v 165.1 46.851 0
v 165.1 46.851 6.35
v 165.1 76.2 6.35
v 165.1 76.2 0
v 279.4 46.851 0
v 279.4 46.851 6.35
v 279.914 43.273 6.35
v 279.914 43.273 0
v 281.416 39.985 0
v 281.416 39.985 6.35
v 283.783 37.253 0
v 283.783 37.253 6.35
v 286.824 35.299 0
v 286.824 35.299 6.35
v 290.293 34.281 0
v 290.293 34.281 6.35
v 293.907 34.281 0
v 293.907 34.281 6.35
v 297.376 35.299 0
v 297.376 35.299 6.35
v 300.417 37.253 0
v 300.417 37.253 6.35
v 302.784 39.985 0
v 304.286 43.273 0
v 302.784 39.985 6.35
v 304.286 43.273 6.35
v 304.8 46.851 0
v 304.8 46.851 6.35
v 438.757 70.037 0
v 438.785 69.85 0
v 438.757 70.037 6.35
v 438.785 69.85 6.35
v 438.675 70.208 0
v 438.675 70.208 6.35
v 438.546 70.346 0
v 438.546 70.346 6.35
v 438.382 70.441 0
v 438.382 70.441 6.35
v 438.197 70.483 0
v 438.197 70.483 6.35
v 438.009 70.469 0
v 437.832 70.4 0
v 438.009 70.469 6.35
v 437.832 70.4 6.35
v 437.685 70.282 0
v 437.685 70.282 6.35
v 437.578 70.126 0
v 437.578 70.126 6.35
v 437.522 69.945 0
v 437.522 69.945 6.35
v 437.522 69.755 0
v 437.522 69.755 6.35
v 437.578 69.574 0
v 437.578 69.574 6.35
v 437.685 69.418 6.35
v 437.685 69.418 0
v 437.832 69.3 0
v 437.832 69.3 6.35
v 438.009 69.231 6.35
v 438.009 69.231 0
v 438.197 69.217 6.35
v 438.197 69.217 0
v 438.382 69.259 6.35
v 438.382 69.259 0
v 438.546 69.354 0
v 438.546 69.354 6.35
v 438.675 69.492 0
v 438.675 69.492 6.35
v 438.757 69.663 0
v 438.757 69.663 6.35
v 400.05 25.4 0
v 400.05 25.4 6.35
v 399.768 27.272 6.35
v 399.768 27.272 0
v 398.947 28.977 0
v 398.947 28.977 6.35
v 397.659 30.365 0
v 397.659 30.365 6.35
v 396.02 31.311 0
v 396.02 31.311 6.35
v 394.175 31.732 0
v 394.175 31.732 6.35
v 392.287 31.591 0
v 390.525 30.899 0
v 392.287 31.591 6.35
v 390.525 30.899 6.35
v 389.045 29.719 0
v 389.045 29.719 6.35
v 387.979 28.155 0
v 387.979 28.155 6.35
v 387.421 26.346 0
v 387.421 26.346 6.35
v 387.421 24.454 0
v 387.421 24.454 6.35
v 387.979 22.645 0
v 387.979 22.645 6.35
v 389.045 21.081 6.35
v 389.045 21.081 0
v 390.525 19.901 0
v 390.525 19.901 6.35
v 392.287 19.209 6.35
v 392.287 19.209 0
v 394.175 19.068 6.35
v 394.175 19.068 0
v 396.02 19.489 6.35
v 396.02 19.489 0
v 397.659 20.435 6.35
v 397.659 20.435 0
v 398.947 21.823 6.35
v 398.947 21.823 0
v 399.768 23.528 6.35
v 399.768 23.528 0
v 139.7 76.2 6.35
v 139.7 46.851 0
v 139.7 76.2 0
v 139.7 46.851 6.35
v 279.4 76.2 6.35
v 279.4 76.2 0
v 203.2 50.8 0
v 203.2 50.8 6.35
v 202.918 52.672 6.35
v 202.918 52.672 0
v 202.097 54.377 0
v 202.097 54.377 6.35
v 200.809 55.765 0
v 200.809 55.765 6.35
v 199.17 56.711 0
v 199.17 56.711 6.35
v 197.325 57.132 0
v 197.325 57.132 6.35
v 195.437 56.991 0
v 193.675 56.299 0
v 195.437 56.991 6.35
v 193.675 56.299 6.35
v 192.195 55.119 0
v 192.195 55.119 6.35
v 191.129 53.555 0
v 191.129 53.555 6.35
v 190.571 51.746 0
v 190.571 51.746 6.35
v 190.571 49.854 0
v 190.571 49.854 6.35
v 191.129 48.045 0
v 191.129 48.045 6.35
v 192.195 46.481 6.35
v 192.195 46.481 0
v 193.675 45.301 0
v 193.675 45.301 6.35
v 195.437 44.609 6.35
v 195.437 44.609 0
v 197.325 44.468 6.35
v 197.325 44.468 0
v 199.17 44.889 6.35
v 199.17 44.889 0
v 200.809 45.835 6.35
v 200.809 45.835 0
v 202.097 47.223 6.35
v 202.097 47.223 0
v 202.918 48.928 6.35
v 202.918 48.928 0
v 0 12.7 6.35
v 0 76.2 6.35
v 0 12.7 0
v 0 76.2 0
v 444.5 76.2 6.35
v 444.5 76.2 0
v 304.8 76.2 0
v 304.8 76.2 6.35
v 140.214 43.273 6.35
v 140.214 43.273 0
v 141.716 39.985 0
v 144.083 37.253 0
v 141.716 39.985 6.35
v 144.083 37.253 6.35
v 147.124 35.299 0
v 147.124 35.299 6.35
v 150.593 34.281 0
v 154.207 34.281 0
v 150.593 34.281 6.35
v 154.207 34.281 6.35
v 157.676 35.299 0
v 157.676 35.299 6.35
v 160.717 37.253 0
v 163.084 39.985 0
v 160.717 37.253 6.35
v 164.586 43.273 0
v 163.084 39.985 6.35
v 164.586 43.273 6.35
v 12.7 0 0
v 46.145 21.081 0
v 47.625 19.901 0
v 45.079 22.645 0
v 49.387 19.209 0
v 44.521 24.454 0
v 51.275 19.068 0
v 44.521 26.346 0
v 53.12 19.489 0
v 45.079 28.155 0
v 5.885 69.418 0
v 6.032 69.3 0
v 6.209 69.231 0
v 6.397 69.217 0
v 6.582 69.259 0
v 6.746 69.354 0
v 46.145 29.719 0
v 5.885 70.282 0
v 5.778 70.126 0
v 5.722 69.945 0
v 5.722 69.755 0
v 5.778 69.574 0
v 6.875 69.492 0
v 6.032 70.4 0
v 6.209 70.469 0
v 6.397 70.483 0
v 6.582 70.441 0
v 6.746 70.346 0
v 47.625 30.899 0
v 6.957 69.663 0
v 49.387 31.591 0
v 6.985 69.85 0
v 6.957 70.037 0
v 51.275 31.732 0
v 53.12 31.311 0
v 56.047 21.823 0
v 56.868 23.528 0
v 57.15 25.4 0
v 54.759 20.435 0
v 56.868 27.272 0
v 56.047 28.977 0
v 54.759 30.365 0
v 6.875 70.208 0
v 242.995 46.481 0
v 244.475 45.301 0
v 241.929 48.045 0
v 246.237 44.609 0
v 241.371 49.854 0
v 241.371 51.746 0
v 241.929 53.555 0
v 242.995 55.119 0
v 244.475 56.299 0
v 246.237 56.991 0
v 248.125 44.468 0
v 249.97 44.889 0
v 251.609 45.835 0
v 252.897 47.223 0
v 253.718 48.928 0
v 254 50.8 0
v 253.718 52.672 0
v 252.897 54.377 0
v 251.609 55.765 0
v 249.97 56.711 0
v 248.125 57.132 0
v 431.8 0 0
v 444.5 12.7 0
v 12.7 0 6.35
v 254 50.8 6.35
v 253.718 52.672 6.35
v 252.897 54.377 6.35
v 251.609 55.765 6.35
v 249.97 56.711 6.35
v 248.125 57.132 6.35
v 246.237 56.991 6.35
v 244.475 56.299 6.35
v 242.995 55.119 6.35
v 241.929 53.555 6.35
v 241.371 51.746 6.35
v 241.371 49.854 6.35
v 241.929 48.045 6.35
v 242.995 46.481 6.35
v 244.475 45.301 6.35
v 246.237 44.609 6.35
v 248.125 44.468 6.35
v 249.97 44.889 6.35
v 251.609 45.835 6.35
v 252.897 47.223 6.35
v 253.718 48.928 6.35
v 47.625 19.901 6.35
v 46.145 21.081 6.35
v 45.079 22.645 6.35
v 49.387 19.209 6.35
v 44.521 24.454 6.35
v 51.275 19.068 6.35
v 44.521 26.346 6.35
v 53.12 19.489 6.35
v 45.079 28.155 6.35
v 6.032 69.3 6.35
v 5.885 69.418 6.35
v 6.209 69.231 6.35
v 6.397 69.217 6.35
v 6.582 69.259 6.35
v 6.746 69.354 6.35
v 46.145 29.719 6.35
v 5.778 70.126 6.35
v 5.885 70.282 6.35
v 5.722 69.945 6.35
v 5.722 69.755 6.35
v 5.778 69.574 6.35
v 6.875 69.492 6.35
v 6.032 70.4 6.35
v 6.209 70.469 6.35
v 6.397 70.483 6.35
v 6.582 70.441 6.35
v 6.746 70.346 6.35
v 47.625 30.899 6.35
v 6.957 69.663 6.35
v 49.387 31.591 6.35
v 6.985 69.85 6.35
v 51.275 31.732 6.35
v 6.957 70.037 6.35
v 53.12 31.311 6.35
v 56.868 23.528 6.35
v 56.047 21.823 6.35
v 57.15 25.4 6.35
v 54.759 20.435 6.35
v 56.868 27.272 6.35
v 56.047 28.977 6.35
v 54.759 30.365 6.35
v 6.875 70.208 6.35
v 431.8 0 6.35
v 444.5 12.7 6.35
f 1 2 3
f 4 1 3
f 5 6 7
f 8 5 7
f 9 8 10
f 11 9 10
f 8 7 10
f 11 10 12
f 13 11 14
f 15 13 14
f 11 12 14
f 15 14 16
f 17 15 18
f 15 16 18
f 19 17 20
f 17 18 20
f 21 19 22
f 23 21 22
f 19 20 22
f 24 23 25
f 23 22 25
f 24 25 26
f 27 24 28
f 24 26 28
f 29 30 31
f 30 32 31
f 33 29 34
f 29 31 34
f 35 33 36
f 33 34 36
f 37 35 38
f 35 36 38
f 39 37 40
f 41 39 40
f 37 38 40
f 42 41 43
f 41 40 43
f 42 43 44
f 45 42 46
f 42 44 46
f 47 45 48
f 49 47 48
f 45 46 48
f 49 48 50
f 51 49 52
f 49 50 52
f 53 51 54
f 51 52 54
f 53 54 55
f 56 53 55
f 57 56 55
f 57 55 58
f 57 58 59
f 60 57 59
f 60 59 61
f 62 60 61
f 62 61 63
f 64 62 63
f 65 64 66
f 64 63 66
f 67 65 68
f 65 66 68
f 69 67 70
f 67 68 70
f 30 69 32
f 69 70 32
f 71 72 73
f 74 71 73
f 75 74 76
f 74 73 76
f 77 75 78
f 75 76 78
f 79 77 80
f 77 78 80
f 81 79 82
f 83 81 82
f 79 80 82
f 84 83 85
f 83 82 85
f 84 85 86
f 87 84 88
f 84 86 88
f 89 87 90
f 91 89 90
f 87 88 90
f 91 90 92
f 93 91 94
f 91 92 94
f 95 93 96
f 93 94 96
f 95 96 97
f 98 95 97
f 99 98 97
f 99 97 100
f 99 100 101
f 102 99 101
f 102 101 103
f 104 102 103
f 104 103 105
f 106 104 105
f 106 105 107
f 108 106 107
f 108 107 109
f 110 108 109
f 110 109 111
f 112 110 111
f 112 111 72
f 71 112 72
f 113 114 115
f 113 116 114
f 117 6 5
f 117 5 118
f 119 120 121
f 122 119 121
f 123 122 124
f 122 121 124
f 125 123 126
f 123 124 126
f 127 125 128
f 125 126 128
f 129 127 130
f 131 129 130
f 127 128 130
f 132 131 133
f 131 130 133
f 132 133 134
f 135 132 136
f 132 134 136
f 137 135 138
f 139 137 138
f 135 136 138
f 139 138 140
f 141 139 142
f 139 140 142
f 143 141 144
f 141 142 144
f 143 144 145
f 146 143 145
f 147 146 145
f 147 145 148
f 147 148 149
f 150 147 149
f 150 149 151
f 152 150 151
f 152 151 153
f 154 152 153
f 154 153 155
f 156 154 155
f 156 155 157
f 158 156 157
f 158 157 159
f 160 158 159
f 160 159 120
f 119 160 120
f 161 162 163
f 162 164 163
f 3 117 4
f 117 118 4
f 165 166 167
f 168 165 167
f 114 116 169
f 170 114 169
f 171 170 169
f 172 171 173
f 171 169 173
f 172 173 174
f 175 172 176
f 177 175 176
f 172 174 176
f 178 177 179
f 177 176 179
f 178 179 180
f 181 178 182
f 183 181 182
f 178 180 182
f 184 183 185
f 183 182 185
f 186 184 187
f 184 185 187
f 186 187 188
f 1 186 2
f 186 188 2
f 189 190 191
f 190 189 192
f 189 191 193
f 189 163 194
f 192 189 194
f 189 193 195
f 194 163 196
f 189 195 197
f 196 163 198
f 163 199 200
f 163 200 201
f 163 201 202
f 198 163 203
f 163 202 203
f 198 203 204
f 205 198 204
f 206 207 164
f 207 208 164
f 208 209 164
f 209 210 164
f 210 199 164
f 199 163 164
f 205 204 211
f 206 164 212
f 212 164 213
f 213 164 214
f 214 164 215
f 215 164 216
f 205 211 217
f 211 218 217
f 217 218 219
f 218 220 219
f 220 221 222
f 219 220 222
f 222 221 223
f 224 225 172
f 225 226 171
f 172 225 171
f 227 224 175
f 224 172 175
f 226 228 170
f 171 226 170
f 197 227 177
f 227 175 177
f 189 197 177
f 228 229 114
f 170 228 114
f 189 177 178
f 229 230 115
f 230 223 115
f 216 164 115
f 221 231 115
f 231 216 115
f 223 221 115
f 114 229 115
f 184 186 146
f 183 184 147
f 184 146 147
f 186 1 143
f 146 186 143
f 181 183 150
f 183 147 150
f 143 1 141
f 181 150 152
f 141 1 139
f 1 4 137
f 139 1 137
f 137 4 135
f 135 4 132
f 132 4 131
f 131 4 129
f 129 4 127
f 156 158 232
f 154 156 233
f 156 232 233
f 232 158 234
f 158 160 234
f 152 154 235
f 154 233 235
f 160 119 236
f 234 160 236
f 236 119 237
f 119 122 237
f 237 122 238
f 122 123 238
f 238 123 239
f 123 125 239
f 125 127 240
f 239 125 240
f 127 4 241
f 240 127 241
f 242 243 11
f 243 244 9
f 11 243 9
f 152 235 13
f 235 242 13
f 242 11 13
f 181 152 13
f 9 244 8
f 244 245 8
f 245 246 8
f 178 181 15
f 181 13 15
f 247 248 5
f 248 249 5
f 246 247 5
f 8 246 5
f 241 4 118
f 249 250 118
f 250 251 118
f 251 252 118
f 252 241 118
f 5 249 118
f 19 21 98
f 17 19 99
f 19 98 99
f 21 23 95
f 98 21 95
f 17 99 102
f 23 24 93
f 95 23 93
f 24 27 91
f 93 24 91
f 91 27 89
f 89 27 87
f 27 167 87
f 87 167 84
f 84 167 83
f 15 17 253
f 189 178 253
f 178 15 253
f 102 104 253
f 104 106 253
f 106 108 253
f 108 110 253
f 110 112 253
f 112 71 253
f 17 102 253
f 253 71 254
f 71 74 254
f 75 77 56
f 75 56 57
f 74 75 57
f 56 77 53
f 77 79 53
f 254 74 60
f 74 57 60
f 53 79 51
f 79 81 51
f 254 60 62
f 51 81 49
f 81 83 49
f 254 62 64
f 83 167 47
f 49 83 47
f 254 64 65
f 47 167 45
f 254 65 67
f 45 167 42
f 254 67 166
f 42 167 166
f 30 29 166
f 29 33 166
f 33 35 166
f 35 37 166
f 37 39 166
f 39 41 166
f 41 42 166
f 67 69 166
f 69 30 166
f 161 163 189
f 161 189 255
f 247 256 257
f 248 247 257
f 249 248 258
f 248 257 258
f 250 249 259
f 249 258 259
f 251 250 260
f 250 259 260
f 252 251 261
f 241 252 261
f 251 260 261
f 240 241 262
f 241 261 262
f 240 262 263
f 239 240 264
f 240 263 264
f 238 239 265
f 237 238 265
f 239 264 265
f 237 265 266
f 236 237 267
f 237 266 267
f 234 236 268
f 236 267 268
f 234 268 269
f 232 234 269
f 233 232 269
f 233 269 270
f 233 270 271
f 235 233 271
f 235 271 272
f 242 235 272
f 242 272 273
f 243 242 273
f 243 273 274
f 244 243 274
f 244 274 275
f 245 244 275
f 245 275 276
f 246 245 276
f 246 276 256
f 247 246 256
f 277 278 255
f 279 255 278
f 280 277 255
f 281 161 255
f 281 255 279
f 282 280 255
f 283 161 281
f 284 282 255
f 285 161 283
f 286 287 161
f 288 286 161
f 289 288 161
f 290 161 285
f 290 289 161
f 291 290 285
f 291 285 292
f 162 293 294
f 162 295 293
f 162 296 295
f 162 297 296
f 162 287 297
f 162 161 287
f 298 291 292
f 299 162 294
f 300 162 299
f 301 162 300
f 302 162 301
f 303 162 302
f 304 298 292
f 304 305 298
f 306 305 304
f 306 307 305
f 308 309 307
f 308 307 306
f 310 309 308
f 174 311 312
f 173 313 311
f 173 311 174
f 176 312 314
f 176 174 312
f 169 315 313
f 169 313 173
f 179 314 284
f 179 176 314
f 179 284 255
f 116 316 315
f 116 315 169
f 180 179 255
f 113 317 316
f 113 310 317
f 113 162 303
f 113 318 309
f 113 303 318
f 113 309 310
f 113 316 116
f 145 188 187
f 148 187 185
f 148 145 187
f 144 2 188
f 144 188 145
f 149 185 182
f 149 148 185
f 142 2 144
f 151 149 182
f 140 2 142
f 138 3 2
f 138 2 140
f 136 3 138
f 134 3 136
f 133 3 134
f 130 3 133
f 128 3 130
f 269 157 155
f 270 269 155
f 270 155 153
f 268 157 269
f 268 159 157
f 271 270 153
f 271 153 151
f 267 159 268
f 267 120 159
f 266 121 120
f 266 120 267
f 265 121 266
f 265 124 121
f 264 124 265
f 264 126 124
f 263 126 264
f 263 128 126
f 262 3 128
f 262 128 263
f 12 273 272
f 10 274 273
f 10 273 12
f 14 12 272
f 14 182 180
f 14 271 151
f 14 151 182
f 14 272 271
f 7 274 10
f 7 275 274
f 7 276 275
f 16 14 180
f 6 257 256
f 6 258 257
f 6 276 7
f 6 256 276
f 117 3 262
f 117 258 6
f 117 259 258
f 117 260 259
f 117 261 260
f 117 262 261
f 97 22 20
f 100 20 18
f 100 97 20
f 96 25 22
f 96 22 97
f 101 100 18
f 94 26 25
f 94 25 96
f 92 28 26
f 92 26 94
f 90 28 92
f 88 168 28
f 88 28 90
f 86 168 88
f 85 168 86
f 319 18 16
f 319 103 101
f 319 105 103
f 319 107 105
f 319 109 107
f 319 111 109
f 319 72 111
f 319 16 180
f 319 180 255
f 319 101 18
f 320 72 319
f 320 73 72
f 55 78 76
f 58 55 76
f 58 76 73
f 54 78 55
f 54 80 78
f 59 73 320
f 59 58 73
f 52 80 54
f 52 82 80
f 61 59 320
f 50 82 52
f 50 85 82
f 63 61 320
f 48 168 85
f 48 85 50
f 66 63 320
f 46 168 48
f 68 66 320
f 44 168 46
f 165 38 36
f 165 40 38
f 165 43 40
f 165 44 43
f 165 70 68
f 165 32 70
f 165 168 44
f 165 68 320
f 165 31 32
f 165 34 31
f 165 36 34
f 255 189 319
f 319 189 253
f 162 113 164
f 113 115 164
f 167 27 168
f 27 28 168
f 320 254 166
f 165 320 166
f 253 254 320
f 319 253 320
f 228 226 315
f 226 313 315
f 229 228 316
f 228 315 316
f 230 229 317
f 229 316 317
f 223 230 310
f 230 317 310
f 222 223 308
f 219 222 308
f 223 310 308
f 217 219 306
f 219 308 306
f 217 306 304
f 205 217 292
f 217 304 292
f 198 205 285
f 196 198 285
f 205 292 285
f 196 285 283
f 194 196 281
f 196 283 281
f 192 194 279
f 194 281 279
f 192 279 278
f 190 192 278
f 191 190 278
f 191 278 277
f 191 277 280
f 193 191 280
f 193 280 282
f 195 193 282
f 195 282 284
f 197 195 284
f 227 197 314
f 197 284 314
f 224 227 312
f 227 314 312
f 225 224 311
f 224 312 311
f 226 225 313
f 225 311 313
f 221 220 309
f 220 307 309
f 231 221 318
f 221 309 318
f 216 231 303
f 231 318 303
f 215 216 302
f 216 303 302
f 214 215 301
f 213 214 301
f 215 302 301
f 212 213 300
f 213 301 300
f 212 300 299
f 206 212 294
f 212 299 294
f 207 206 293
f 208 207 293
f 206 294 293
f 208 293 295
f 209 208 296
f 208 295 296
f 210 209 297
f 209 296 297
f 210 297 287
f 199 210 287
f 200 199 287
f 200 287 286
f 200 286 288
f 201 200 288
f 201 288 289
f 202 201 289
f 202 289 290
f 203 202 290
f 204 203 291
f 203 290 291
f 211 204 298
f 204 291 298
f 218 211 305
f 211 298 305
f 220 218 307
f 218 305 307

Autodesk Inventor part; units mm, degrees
ref_plane "YZ Plane" through (0, 0, 0) normal (1, 0, 0) x (0, 1, 0)
ref_plane "XZ Plane" through (0, 0, 0) normal (0, 1, 0) x (-1, 0, 0)
ref_plane "XY Plane" through (0, 0, 0) normal (0, 0, 1) x (1, 0, 0)
sketch "Sketch1" plane through (0, 0, 0) normal (0, 0, 1) x (1, 0, 0)
  line L0 (0, 0) -> (444.5, 0)
  line L1 (444.5, 0) -> (444.5, 76.2)
  line L2 (444.5, 76.2) -> (0, 76.2)
  line L3 (0, 76.2) -> (0, 0)
  dimension "d0" = 444.5
  dimension "d1" = 76.2
extrude "Extrusion1" add sketch "Sketch1" along normal blind 6.35
chamfer "Chamfer1" distance 12.7 angle 45 1 edges at (444.5, 0, 3.175)
chamfer "Chamfer2" distance 12.7 angle 45 1 edges at (0, 0, 3.175)
sketch "Sketch2" plane through (0, 0, 6.35) normal (0, 0, 1) x (1, 0, 0)
  line L0 (0, 46.8514) -> (152.4, 46.8514)
  line L1 (444.5, 12.7) -> (444.5, 76.2) projected
  line L2 (292.1, 46.8514) -> (444.5, 46.8514)
  circle A0 centre (152.4, 46.8514) radius 12.7
  circle A1 centre (292.1, 46.8514) radius 12.7
  point P0 (0, 0)
  point P1 (139.7, 46.8514)
  point P2 (165.1, 46.8514)
  dimension "d10" = 152.4
  dimension "d11" = 25.4
  dimension "d12" = 25.4
extrude "Extrusion2" cut sketch "Sketch2" against normal blind 25.4
sketch "Sketch3" plane through (0, 0, 6.35) normal (0, 0, 1) x (1, 0, 0)
  circle A0 centre (152.4, 46.8514) radius 12.7 projected
  line L0 (139.7, 46.8514) -> (139.7, 76.2)
  line L1 (165.1, 46.8514) -> (165.1, 76.2)
  line L2 (444.5, 76.2) -> (0, 76.2) projected
  line L3 (139.7, 76.2) -> (165.1, 76.2)
  arc A1 (139.7, 46.8514) -> (165.1, 46.8514) centre (152.4, 46.8514) ccw
  point P0 (0, 0)
extrude "Extrusion3" cut sketch "Sketch3" against normal blind 25.4 contours A0 L0 L2 L1
sketch "Sketch4" plane through (0, 0, 6.35) normal (0, 0, 1) x (1, 0, 0)
  circle A0 centre (292.1, 46.8514) radius 12.7 projected
  line L0 (279.4, 46.8514) -> (279.4, 76.2)
  line L1 (444.5, 76.2) -> (165.1, 76.2) projected
  line L2 (304.8, 46.8514) -> (304.8, 76.2)
  line L3 (304.8, 76.2) -> (279.4, 76.2)
  arc A1 (279.4, 46.8514) -> (304.8, 46.8514) centre (292.1, 46.8514) ccw
  point P0 (0, 0)
extrude "Extrusion4" cut sketch "Sketch4" against normal blind 25.4 contours A0 L0 L1 L2
sketch "Sketch5" plane through (0, 0, 6.35) normal (0, 0, 1) x (1, 0, 0)
  line L0 (0, 76.2) -> (0, 12.7) projected
  line L1 (12.7, 0) -> (431.8, 0) projected
  line L2 (444.5, 12.7) -> (444.5, 76.2) projected
  circle A0 centre (50.8, 25.4) radius 6.35
  circle A1 centre (393.7, 25.4) radius 6.35
  point P0 (0, 0)
  dimension "d19" = 50.8
  dimension "d20" = 25.4
  dimension "d21" = 25.4
  dimension "d22" = 50.8
  dimension "d23" = 12.7
  dimension "d24" = 12.7
extrude "Extrusion5" cut sketch "Sketch5" against normal blind 25.4
sketch "Sketch6" plane through (0, 0, 6.35) normal (0, 0, 1) x (1, 0, 0)
  line L0 (139.7, 76.2) -> (0, 76.2) projected
  line L1 (0, 76.2) -> (0, 12.7) projected
  line L2 (444.5, 76.2) -> (304.8, 76.2) projected
  line L3 (444.5, 12.7) -> (444.5, 76.2) projected
  circle A0 centre (6.35, 69.85) radius 0.635
  circle A1 centre (438.15, 69.85) radius 0.635
  point P0 (0, 0)
  dimension "d27" = 6.35
  dimension "d28" = 6.35
  dimension "d29" = 6.35
  dimension "d30" = 6.35
  dimension "d31" = 1.27
  dimension "d32" = 1.27
extrude "Extrusion6" cut sketch "Sketch6" against normal blind 25.4
sketch "Sketch7" plane through (0, 0, 6.35) normal (0, 0, 1) x (1, 0, 0)
  line L0 (279.4, 76.2) -> (165.1, 76.2) projected
  line L1 (165.1, 76.2) -> (165.1, 46.8514) projected
  line L2 (279.4, 46.8514) -> (279.4, 76.2) projected
  circle A0 centre (196.85, 50.8) radius 6.35
  circle A1 centre (247.65, 50.8) radius 6.35
  point P0 (0, 0)
  dimension "d35" = 25.4
  dimension "d36" = 31.75
  dimension "d37" = 25.4
  dimension "d38" = 31.75
  dimension "d39" = 12.7
  dimension "d40" = 12.7
extrude "Extrusion7" cut sketch "Sketch7" against normal blind 25.4
properties part number "Lauren's Part"
